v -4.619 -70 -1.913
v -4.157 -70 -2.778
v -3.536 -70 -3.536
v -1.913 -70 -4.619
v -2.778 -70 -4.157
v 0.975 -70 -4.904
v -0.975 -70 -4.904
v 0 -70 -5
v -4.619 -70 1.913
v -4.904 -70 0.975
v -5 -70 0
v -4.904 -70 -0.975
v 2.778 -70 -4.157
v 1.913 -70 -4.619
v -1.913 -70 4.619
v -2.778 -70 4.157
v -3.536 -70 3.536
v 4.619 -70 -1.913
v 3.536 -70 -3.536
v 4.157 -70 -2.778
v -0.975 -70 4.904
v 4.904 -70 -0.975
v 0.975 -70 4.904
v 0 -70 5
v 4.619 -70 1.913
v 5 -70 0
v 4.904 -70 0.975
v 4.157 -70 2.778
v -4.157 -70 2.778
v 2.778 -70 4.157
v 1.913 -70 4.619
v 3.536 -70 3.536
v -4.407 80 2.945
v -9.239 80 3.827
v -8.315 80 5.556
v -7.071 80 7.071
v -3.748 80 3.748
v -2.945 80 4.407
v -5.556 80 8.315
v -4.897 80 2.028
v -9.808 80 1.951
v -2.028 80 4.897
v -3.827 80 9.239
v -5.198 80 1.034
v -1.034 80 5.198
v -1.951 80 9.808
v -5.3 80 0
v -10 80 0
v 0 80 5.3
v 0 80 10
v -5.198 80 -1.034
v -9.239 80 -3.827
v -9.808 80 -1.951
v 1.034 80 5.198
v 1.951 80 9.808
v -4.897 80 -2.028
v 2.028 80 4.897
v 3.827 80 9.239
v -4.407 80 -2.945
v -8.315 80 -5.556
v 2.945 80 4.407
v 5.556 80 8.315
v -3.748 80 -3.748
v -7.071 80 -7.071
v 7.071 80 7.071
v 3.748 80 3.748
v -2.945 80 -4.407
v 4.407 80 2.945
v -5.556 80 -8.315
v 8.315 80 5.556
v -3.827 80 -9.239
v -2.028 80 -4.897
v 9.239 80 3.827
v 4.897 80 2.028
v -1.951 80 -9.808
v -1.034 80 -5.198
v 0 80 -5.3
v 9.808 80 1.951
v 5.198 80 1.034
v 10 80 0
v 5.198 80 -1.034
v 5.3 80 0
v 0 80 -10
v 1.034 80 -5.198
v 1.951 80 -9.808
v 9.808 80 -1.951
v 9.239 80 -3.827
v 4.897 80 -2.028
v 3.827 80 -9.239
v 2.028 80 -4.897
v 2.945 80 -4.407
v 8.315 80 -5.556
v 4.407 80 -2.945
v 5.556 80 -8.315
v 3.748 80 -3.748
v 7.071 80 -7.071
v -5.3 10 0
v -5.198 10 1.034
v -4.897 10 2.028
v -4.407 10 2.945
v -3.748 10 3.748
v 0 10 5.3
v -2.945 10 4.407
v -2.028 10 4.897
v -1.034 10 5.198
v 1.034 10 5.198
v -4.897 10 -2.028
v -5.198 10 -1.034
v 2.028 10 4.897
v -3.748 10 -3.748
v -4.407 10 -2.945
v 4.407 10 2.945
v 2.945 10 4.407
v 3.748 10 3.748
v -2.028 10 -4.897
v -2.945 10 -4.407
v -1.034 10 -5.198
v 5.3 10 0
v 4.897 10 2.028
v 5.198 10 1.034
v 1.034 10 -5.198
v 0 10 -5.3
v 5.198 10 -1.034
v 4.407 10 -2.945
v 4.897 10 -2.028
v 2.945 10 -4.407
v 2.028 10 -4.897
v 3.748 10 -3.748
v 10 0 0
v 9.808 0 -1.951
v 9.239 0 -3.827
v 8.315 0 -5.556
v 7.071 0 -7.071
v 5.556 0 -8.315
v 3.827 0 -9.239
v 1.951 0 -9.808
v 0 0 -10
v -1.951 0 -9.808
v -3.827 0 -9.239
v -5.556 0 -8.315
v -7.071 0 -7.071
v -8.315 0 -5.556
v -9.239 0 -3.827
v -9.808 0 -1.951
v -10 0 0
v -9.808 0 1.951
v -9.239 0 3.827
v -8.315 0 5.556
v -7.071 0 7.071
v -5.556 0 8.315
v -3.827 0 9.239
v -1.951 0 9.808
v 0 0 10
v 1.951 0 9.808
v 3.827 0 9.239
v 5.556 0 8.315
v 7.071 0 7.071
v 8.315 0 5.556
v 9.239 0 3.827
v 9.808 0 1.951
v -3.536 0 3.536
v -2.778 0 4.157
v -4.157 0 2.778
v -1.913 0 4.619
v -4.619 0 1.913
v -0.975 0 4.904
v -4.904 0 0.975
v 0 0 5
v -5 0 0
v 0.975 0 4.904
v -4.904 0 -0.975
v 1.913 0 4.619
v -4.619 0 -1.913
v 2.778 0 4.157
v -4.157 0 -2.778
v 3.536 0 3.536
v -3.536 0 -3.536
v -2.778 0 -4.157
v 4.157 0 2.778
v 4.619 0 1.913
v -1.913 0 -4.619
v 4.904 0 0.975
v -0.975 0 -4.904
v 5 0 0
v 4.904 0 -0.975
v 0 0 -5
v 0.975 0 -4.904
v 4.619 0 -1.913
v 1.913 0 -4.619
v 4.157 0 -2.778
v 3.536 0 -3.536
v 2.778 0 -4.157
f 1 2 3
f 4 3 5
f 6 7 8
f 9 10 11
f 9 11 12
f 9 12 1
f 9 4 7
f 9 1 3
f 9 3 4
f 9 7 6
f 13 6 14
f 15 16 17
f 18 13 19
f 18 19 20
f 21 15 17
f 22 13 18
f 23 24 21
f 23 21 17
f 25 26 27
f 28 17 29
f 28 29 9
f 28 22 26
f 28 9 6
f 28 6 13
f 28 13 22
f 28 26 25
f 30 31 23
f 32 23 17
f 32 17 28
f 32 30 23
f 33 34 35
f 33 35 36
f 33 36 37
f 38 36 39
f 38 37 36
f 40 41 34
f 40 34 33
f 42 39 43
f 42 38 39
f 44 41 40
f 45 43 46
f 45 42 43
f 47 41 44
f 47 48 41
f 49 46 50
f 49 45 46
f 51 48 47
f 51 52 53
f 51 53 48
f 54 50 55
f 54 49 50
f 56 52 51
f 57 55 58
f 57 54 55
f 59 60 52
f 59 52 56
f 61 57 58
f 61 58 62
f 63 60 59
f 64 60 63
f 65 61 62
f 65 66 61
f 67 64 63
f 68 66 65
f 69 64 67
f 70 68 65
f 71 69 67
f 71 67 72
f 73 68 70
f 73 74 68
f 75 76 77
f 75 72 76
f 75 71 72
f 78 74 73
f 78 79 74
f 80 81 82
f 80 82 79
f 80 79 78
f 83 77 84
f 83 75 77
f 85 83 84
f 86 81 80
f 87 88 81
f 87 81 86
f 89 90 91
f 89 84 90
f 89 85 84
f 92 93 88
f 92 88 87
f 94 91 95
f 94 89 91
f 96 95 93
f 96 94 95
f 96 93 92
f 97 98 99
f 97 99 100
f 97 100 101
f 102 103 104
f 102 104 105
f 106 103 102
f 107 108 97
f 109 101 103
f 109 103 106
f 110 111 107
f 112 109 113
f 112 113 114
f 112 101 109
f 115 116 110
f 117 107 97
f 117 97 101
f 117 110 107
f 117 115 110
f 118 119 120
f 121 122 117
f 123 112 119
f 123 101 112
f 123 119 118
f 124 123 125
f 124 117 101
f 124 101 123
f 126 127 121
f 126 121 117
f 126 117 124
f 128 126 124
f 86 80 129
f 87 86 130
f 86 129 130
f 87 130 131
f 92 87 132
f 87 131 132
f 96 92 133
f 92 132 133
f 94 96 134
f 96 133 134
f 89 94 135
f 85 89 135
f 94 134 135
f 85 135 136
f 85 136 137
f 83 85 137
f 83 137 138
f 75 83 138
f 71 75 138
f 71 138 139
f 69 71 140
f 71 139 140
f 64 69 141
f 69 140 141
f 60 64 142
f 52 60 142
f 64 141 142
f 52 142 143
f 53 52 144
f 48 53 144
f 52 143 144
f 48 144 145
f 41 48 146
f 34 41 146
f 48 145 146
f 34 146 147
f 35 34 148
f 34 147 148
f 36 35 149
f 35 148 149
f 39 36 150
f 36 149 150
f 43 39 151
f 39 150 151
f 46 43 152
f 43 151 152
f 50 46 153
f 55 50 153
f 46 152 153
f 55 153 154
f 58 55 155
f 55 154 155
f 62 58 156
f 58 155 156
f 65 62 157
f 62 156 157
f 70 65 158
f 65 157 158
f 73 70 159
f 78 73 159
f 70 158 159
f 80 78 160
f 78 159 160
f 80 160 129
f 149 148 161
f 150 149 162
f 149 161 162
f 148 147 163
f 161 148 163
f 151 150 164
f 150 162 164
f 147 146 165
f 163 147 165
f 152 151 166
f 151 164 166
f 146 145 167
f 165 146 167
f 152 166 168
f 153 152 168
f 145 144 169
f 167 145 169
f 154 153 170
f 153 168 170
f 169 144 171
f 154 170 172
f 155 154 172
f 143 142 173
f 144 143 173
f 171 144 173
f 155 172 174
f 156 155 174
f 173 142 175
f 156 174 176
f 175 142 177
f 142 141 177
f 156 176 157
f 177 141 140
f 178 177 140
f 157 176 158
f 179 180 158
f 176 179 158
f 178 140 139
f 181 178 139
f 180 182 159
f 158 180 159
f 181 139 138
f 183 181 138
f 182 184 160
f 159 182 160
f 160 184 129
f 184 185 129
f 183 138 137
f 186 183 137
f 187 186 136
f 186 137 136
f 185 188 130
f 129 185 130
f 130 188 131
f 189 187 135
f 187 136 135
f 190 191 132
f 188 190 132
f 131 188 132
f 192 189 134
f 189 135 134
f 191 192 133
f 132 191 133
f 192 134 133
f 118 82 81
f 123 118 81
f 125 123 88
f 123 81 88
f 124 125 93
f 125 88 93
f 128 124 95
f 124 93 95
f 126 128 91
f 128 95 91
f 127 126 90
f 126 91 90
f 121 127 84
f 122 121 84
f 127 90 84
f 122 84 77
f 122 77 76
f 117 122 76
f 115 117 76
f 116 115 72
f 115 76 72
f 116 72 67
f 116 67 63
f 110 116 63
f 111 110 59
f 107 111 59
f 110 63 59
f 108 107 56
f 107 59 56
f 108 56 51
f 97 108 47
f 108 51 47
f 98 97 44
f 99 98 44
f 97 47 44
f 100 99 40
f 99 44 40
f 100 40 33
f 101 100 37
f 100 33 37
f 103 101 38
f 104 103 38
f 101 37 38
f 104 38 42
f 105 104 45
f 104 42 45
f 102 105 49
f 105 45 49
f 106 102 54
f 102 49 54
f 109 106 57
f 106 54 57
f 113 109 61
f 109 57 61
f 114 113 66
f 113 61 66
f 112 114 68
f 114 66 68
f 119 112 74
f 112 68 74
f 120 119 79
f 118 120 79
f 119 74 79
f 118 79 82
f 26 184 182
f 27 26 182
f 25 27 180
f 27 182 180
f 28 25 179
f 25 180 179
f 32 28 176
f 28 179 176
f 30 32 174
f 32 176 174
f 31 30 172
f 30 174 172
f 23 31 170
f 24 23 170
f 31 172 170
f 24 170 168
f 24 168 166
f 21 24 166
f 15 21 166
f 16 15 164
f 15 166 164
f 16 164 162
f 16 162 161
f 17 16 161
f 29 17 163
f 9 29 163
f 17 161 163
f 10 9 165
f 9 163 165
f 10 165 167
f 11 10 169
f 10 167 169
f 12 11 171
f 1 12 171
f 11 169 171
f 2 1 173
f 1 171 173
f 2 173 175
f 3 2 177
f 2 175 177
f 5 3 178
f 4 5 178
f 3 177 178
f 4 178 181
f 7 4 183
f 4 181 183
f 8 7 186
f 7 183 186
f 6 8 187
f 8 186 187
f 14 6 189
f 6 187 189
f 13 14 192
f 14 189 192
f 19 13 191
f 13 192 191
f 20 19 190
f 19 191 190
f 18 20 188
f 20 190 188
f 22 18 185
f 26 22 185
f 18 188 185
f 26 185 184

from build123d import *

# Parameters (mm, degrees)
SKETCH15_R           = 10
BOSS_EXTRUDE11_DEPTH = 80
SKETCH16_R           = 5.3
CUT_EXTRUDE1_DEPTH   = 70
SKETCH18_R           = 5
BOSS_EXTRUDE14_DEPTH = 70


with BuildPart() as part:
    # Sketch15 → Boss-Extrude11 (new body)
    with BuildSketch(Plane(origin=(0, 0, 0), x_dir=(1, 0, 0), z_dir=(0, 1, 0))):
        Circle(SKETCH15_R)
    extrude(amount=BOSS_EXTRUDE11_DEPTH)

    # Sketch16 → Cut-Extrude1 (cut)
    with BuildSketch(Plane(origin=(0, 80, 0), x_dir=(1, 0, 0), z_dir=(0, 1, 0))):
        Circle(SKETCH16_R)
    extrude(amount=-CUT_EXTRUDE1_DEPTH, mode=Mode.SUBTRACT)

    # Sketch18 → Boss-Extrude14 (add)
    with BuildSketch(Plane.XZ):
        Circle(SKETCH18_R)
    extrude(amount=BOSS_EXTRUDE14_DEPTH)


solid = part.part
